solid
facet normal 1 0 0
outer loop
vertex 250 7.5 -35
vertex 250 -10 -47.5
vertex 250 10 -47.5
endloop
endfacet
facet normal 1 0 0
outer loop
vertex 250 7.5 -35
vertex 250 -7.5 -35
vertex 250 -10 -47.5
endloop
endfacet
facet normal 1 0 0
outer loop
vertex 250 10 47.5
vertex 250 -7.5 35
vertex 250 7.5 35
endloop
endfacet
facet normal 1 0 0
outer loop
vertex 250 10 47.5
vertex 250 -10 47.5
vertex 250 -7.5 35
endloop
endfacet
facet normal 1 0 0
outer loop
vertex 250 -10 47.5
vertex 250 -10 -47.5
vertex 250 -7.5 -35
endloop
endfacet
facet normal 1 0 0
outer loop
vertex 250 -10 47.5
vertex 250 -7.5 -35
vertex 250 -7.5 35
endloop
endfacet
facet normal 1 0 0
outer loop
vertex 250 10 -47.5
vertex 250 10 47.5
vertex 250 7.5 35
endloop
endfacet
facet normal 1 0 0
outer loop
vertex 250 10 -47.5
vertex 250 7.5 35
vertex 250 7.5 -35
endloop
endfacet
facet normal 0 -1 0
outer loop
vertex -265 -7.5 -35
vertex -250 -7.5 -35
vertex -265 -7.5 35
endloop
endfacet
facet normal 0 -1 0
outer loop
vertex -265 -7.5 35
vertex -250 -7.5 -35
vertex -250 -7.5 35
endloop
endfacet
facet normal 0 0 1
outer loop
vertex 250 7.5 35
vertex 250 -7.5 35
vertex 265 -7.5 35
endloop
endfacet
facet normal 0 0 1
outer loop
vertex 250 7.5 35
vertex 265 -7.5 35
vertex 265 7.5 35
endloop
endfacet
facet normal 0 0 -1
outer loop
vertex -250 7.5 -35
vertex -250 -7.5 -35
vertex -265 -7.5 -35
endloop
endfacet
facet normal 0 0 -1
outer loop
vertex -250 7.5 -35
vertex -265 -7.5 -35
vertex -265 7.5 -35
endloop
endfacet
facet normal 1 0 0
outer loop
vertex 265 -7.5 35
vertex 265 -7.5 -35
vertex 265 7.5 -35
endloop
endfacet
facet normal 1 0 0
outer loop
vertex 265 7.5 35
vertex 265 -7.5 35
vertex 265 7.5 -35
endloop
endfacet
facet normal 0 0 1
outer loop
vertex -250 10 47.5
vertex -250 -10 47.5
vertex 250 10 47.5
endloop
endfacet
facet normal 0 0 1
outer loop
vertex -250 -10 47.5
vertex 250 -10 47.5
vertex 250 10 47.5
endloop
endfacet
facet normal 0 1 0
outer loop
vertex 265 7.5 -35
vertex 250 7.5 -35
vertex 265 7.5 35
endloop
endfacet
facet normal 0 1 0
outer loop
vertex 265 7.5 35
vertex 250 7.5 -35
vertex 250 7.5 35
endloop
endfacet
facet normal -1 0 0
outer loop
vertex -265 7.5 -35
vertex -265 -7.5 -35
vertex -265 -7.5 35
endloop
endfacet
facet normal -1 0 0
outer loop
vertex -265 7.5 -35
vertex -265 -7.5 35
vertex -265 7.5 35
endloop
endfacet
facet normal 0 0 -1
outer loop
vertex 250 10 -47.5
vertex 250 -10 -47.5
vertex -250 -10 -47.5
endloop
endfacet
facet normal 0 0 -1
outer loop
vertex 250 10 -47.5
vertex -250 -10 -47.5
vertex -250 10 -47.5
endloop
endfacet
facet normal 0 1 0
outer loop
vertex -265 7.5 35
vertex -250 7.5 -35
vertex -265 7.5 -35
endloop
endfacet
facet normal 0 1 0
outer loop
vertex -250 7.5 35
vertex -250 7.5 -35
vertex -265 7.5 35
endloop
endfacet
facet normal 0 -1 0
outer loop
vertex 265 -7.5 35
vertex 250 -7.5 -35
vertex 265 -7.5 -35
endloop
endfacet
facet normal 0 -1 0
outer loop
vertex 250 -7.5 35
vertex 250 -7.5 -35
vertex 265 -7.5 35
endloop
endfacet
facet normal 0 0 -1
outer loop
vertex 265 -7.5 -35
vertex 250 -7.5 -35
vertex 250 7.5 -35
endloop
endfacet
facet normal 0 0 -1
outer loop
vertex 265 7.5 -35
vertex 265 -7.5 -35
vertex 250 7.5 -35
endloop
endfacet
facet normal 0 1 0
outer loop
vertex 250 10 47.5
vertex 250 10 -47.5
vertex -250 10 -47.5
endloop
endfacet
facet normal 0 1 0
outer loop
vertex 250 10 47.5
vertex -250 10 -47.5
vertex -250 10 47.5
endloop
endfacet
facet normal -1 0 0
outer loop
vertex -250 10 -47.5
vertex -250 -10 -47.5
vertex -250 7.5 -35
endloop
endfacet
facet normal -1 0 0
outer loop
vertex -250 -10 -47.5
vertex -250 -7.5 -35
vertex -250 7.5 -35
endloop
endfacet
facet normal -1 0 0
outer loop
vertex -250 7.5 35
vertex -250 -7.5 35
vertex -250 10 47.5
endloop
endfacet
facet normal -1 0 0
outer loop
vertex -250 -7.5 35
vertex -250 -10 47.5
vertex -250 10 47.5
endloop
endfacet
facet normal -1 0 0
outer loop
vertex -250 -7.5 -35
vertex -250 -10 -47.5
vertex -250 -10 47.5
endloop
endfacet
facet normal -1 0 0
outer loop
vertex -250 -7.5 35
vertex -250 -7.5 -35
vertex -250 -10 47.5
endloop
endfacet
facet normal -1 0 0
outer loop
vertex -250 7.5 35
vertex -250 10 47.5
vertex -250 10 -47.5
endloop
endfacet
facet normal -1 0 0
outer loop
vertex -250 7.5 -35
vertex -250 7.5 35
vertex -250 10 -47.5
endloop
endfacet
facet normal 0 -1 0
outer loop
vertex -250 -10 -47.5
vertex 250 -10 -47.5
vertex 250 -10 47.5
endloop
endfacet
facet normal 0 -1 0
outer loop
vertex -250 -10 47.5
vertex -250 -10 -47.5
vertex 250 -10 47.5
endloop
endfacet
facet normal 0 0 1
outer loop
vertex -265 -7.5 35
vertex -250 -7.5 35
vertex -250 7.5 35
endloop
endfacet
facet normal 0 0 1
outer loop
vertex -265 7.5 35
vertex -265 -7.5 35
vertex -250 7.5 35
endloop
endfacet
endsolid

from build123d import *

# Parameters (mm, degrees)
F0_W     = 20
F0_H     = 95
F1_DEPTH = 250
F2_W     = 15
F2_H     = 70
F3_DEPTH = 15


# Not quite as in the source:
# - a pattern or mirror of a feature is missing from the dataset's text; its kind, count and spacing are read off the source's solid


with BuildPart() as f1:
    # F0 (on Right) → F1 (new body, symmetric)
    with BuildSketch(Plane.YZ):
        Rectangle(F0_W, F0_H)
    extrude(amount=F1_DEPTH, both=True)

    # F2 (on face) → F3 (join)
    with BuildSketch(Plane.YZ.offset(250)):
        Rectangle(F2_W, F2_H)
    f3 = extrude(amount=F3_DEPTH)

    # F3_copies: F3 across plane
    add(f3.mirror(Plane(origin=(0, 0, 0), x_dir=(0, 0, -1), z_dir=(-1, 0, 0))))


solid = f1.part
